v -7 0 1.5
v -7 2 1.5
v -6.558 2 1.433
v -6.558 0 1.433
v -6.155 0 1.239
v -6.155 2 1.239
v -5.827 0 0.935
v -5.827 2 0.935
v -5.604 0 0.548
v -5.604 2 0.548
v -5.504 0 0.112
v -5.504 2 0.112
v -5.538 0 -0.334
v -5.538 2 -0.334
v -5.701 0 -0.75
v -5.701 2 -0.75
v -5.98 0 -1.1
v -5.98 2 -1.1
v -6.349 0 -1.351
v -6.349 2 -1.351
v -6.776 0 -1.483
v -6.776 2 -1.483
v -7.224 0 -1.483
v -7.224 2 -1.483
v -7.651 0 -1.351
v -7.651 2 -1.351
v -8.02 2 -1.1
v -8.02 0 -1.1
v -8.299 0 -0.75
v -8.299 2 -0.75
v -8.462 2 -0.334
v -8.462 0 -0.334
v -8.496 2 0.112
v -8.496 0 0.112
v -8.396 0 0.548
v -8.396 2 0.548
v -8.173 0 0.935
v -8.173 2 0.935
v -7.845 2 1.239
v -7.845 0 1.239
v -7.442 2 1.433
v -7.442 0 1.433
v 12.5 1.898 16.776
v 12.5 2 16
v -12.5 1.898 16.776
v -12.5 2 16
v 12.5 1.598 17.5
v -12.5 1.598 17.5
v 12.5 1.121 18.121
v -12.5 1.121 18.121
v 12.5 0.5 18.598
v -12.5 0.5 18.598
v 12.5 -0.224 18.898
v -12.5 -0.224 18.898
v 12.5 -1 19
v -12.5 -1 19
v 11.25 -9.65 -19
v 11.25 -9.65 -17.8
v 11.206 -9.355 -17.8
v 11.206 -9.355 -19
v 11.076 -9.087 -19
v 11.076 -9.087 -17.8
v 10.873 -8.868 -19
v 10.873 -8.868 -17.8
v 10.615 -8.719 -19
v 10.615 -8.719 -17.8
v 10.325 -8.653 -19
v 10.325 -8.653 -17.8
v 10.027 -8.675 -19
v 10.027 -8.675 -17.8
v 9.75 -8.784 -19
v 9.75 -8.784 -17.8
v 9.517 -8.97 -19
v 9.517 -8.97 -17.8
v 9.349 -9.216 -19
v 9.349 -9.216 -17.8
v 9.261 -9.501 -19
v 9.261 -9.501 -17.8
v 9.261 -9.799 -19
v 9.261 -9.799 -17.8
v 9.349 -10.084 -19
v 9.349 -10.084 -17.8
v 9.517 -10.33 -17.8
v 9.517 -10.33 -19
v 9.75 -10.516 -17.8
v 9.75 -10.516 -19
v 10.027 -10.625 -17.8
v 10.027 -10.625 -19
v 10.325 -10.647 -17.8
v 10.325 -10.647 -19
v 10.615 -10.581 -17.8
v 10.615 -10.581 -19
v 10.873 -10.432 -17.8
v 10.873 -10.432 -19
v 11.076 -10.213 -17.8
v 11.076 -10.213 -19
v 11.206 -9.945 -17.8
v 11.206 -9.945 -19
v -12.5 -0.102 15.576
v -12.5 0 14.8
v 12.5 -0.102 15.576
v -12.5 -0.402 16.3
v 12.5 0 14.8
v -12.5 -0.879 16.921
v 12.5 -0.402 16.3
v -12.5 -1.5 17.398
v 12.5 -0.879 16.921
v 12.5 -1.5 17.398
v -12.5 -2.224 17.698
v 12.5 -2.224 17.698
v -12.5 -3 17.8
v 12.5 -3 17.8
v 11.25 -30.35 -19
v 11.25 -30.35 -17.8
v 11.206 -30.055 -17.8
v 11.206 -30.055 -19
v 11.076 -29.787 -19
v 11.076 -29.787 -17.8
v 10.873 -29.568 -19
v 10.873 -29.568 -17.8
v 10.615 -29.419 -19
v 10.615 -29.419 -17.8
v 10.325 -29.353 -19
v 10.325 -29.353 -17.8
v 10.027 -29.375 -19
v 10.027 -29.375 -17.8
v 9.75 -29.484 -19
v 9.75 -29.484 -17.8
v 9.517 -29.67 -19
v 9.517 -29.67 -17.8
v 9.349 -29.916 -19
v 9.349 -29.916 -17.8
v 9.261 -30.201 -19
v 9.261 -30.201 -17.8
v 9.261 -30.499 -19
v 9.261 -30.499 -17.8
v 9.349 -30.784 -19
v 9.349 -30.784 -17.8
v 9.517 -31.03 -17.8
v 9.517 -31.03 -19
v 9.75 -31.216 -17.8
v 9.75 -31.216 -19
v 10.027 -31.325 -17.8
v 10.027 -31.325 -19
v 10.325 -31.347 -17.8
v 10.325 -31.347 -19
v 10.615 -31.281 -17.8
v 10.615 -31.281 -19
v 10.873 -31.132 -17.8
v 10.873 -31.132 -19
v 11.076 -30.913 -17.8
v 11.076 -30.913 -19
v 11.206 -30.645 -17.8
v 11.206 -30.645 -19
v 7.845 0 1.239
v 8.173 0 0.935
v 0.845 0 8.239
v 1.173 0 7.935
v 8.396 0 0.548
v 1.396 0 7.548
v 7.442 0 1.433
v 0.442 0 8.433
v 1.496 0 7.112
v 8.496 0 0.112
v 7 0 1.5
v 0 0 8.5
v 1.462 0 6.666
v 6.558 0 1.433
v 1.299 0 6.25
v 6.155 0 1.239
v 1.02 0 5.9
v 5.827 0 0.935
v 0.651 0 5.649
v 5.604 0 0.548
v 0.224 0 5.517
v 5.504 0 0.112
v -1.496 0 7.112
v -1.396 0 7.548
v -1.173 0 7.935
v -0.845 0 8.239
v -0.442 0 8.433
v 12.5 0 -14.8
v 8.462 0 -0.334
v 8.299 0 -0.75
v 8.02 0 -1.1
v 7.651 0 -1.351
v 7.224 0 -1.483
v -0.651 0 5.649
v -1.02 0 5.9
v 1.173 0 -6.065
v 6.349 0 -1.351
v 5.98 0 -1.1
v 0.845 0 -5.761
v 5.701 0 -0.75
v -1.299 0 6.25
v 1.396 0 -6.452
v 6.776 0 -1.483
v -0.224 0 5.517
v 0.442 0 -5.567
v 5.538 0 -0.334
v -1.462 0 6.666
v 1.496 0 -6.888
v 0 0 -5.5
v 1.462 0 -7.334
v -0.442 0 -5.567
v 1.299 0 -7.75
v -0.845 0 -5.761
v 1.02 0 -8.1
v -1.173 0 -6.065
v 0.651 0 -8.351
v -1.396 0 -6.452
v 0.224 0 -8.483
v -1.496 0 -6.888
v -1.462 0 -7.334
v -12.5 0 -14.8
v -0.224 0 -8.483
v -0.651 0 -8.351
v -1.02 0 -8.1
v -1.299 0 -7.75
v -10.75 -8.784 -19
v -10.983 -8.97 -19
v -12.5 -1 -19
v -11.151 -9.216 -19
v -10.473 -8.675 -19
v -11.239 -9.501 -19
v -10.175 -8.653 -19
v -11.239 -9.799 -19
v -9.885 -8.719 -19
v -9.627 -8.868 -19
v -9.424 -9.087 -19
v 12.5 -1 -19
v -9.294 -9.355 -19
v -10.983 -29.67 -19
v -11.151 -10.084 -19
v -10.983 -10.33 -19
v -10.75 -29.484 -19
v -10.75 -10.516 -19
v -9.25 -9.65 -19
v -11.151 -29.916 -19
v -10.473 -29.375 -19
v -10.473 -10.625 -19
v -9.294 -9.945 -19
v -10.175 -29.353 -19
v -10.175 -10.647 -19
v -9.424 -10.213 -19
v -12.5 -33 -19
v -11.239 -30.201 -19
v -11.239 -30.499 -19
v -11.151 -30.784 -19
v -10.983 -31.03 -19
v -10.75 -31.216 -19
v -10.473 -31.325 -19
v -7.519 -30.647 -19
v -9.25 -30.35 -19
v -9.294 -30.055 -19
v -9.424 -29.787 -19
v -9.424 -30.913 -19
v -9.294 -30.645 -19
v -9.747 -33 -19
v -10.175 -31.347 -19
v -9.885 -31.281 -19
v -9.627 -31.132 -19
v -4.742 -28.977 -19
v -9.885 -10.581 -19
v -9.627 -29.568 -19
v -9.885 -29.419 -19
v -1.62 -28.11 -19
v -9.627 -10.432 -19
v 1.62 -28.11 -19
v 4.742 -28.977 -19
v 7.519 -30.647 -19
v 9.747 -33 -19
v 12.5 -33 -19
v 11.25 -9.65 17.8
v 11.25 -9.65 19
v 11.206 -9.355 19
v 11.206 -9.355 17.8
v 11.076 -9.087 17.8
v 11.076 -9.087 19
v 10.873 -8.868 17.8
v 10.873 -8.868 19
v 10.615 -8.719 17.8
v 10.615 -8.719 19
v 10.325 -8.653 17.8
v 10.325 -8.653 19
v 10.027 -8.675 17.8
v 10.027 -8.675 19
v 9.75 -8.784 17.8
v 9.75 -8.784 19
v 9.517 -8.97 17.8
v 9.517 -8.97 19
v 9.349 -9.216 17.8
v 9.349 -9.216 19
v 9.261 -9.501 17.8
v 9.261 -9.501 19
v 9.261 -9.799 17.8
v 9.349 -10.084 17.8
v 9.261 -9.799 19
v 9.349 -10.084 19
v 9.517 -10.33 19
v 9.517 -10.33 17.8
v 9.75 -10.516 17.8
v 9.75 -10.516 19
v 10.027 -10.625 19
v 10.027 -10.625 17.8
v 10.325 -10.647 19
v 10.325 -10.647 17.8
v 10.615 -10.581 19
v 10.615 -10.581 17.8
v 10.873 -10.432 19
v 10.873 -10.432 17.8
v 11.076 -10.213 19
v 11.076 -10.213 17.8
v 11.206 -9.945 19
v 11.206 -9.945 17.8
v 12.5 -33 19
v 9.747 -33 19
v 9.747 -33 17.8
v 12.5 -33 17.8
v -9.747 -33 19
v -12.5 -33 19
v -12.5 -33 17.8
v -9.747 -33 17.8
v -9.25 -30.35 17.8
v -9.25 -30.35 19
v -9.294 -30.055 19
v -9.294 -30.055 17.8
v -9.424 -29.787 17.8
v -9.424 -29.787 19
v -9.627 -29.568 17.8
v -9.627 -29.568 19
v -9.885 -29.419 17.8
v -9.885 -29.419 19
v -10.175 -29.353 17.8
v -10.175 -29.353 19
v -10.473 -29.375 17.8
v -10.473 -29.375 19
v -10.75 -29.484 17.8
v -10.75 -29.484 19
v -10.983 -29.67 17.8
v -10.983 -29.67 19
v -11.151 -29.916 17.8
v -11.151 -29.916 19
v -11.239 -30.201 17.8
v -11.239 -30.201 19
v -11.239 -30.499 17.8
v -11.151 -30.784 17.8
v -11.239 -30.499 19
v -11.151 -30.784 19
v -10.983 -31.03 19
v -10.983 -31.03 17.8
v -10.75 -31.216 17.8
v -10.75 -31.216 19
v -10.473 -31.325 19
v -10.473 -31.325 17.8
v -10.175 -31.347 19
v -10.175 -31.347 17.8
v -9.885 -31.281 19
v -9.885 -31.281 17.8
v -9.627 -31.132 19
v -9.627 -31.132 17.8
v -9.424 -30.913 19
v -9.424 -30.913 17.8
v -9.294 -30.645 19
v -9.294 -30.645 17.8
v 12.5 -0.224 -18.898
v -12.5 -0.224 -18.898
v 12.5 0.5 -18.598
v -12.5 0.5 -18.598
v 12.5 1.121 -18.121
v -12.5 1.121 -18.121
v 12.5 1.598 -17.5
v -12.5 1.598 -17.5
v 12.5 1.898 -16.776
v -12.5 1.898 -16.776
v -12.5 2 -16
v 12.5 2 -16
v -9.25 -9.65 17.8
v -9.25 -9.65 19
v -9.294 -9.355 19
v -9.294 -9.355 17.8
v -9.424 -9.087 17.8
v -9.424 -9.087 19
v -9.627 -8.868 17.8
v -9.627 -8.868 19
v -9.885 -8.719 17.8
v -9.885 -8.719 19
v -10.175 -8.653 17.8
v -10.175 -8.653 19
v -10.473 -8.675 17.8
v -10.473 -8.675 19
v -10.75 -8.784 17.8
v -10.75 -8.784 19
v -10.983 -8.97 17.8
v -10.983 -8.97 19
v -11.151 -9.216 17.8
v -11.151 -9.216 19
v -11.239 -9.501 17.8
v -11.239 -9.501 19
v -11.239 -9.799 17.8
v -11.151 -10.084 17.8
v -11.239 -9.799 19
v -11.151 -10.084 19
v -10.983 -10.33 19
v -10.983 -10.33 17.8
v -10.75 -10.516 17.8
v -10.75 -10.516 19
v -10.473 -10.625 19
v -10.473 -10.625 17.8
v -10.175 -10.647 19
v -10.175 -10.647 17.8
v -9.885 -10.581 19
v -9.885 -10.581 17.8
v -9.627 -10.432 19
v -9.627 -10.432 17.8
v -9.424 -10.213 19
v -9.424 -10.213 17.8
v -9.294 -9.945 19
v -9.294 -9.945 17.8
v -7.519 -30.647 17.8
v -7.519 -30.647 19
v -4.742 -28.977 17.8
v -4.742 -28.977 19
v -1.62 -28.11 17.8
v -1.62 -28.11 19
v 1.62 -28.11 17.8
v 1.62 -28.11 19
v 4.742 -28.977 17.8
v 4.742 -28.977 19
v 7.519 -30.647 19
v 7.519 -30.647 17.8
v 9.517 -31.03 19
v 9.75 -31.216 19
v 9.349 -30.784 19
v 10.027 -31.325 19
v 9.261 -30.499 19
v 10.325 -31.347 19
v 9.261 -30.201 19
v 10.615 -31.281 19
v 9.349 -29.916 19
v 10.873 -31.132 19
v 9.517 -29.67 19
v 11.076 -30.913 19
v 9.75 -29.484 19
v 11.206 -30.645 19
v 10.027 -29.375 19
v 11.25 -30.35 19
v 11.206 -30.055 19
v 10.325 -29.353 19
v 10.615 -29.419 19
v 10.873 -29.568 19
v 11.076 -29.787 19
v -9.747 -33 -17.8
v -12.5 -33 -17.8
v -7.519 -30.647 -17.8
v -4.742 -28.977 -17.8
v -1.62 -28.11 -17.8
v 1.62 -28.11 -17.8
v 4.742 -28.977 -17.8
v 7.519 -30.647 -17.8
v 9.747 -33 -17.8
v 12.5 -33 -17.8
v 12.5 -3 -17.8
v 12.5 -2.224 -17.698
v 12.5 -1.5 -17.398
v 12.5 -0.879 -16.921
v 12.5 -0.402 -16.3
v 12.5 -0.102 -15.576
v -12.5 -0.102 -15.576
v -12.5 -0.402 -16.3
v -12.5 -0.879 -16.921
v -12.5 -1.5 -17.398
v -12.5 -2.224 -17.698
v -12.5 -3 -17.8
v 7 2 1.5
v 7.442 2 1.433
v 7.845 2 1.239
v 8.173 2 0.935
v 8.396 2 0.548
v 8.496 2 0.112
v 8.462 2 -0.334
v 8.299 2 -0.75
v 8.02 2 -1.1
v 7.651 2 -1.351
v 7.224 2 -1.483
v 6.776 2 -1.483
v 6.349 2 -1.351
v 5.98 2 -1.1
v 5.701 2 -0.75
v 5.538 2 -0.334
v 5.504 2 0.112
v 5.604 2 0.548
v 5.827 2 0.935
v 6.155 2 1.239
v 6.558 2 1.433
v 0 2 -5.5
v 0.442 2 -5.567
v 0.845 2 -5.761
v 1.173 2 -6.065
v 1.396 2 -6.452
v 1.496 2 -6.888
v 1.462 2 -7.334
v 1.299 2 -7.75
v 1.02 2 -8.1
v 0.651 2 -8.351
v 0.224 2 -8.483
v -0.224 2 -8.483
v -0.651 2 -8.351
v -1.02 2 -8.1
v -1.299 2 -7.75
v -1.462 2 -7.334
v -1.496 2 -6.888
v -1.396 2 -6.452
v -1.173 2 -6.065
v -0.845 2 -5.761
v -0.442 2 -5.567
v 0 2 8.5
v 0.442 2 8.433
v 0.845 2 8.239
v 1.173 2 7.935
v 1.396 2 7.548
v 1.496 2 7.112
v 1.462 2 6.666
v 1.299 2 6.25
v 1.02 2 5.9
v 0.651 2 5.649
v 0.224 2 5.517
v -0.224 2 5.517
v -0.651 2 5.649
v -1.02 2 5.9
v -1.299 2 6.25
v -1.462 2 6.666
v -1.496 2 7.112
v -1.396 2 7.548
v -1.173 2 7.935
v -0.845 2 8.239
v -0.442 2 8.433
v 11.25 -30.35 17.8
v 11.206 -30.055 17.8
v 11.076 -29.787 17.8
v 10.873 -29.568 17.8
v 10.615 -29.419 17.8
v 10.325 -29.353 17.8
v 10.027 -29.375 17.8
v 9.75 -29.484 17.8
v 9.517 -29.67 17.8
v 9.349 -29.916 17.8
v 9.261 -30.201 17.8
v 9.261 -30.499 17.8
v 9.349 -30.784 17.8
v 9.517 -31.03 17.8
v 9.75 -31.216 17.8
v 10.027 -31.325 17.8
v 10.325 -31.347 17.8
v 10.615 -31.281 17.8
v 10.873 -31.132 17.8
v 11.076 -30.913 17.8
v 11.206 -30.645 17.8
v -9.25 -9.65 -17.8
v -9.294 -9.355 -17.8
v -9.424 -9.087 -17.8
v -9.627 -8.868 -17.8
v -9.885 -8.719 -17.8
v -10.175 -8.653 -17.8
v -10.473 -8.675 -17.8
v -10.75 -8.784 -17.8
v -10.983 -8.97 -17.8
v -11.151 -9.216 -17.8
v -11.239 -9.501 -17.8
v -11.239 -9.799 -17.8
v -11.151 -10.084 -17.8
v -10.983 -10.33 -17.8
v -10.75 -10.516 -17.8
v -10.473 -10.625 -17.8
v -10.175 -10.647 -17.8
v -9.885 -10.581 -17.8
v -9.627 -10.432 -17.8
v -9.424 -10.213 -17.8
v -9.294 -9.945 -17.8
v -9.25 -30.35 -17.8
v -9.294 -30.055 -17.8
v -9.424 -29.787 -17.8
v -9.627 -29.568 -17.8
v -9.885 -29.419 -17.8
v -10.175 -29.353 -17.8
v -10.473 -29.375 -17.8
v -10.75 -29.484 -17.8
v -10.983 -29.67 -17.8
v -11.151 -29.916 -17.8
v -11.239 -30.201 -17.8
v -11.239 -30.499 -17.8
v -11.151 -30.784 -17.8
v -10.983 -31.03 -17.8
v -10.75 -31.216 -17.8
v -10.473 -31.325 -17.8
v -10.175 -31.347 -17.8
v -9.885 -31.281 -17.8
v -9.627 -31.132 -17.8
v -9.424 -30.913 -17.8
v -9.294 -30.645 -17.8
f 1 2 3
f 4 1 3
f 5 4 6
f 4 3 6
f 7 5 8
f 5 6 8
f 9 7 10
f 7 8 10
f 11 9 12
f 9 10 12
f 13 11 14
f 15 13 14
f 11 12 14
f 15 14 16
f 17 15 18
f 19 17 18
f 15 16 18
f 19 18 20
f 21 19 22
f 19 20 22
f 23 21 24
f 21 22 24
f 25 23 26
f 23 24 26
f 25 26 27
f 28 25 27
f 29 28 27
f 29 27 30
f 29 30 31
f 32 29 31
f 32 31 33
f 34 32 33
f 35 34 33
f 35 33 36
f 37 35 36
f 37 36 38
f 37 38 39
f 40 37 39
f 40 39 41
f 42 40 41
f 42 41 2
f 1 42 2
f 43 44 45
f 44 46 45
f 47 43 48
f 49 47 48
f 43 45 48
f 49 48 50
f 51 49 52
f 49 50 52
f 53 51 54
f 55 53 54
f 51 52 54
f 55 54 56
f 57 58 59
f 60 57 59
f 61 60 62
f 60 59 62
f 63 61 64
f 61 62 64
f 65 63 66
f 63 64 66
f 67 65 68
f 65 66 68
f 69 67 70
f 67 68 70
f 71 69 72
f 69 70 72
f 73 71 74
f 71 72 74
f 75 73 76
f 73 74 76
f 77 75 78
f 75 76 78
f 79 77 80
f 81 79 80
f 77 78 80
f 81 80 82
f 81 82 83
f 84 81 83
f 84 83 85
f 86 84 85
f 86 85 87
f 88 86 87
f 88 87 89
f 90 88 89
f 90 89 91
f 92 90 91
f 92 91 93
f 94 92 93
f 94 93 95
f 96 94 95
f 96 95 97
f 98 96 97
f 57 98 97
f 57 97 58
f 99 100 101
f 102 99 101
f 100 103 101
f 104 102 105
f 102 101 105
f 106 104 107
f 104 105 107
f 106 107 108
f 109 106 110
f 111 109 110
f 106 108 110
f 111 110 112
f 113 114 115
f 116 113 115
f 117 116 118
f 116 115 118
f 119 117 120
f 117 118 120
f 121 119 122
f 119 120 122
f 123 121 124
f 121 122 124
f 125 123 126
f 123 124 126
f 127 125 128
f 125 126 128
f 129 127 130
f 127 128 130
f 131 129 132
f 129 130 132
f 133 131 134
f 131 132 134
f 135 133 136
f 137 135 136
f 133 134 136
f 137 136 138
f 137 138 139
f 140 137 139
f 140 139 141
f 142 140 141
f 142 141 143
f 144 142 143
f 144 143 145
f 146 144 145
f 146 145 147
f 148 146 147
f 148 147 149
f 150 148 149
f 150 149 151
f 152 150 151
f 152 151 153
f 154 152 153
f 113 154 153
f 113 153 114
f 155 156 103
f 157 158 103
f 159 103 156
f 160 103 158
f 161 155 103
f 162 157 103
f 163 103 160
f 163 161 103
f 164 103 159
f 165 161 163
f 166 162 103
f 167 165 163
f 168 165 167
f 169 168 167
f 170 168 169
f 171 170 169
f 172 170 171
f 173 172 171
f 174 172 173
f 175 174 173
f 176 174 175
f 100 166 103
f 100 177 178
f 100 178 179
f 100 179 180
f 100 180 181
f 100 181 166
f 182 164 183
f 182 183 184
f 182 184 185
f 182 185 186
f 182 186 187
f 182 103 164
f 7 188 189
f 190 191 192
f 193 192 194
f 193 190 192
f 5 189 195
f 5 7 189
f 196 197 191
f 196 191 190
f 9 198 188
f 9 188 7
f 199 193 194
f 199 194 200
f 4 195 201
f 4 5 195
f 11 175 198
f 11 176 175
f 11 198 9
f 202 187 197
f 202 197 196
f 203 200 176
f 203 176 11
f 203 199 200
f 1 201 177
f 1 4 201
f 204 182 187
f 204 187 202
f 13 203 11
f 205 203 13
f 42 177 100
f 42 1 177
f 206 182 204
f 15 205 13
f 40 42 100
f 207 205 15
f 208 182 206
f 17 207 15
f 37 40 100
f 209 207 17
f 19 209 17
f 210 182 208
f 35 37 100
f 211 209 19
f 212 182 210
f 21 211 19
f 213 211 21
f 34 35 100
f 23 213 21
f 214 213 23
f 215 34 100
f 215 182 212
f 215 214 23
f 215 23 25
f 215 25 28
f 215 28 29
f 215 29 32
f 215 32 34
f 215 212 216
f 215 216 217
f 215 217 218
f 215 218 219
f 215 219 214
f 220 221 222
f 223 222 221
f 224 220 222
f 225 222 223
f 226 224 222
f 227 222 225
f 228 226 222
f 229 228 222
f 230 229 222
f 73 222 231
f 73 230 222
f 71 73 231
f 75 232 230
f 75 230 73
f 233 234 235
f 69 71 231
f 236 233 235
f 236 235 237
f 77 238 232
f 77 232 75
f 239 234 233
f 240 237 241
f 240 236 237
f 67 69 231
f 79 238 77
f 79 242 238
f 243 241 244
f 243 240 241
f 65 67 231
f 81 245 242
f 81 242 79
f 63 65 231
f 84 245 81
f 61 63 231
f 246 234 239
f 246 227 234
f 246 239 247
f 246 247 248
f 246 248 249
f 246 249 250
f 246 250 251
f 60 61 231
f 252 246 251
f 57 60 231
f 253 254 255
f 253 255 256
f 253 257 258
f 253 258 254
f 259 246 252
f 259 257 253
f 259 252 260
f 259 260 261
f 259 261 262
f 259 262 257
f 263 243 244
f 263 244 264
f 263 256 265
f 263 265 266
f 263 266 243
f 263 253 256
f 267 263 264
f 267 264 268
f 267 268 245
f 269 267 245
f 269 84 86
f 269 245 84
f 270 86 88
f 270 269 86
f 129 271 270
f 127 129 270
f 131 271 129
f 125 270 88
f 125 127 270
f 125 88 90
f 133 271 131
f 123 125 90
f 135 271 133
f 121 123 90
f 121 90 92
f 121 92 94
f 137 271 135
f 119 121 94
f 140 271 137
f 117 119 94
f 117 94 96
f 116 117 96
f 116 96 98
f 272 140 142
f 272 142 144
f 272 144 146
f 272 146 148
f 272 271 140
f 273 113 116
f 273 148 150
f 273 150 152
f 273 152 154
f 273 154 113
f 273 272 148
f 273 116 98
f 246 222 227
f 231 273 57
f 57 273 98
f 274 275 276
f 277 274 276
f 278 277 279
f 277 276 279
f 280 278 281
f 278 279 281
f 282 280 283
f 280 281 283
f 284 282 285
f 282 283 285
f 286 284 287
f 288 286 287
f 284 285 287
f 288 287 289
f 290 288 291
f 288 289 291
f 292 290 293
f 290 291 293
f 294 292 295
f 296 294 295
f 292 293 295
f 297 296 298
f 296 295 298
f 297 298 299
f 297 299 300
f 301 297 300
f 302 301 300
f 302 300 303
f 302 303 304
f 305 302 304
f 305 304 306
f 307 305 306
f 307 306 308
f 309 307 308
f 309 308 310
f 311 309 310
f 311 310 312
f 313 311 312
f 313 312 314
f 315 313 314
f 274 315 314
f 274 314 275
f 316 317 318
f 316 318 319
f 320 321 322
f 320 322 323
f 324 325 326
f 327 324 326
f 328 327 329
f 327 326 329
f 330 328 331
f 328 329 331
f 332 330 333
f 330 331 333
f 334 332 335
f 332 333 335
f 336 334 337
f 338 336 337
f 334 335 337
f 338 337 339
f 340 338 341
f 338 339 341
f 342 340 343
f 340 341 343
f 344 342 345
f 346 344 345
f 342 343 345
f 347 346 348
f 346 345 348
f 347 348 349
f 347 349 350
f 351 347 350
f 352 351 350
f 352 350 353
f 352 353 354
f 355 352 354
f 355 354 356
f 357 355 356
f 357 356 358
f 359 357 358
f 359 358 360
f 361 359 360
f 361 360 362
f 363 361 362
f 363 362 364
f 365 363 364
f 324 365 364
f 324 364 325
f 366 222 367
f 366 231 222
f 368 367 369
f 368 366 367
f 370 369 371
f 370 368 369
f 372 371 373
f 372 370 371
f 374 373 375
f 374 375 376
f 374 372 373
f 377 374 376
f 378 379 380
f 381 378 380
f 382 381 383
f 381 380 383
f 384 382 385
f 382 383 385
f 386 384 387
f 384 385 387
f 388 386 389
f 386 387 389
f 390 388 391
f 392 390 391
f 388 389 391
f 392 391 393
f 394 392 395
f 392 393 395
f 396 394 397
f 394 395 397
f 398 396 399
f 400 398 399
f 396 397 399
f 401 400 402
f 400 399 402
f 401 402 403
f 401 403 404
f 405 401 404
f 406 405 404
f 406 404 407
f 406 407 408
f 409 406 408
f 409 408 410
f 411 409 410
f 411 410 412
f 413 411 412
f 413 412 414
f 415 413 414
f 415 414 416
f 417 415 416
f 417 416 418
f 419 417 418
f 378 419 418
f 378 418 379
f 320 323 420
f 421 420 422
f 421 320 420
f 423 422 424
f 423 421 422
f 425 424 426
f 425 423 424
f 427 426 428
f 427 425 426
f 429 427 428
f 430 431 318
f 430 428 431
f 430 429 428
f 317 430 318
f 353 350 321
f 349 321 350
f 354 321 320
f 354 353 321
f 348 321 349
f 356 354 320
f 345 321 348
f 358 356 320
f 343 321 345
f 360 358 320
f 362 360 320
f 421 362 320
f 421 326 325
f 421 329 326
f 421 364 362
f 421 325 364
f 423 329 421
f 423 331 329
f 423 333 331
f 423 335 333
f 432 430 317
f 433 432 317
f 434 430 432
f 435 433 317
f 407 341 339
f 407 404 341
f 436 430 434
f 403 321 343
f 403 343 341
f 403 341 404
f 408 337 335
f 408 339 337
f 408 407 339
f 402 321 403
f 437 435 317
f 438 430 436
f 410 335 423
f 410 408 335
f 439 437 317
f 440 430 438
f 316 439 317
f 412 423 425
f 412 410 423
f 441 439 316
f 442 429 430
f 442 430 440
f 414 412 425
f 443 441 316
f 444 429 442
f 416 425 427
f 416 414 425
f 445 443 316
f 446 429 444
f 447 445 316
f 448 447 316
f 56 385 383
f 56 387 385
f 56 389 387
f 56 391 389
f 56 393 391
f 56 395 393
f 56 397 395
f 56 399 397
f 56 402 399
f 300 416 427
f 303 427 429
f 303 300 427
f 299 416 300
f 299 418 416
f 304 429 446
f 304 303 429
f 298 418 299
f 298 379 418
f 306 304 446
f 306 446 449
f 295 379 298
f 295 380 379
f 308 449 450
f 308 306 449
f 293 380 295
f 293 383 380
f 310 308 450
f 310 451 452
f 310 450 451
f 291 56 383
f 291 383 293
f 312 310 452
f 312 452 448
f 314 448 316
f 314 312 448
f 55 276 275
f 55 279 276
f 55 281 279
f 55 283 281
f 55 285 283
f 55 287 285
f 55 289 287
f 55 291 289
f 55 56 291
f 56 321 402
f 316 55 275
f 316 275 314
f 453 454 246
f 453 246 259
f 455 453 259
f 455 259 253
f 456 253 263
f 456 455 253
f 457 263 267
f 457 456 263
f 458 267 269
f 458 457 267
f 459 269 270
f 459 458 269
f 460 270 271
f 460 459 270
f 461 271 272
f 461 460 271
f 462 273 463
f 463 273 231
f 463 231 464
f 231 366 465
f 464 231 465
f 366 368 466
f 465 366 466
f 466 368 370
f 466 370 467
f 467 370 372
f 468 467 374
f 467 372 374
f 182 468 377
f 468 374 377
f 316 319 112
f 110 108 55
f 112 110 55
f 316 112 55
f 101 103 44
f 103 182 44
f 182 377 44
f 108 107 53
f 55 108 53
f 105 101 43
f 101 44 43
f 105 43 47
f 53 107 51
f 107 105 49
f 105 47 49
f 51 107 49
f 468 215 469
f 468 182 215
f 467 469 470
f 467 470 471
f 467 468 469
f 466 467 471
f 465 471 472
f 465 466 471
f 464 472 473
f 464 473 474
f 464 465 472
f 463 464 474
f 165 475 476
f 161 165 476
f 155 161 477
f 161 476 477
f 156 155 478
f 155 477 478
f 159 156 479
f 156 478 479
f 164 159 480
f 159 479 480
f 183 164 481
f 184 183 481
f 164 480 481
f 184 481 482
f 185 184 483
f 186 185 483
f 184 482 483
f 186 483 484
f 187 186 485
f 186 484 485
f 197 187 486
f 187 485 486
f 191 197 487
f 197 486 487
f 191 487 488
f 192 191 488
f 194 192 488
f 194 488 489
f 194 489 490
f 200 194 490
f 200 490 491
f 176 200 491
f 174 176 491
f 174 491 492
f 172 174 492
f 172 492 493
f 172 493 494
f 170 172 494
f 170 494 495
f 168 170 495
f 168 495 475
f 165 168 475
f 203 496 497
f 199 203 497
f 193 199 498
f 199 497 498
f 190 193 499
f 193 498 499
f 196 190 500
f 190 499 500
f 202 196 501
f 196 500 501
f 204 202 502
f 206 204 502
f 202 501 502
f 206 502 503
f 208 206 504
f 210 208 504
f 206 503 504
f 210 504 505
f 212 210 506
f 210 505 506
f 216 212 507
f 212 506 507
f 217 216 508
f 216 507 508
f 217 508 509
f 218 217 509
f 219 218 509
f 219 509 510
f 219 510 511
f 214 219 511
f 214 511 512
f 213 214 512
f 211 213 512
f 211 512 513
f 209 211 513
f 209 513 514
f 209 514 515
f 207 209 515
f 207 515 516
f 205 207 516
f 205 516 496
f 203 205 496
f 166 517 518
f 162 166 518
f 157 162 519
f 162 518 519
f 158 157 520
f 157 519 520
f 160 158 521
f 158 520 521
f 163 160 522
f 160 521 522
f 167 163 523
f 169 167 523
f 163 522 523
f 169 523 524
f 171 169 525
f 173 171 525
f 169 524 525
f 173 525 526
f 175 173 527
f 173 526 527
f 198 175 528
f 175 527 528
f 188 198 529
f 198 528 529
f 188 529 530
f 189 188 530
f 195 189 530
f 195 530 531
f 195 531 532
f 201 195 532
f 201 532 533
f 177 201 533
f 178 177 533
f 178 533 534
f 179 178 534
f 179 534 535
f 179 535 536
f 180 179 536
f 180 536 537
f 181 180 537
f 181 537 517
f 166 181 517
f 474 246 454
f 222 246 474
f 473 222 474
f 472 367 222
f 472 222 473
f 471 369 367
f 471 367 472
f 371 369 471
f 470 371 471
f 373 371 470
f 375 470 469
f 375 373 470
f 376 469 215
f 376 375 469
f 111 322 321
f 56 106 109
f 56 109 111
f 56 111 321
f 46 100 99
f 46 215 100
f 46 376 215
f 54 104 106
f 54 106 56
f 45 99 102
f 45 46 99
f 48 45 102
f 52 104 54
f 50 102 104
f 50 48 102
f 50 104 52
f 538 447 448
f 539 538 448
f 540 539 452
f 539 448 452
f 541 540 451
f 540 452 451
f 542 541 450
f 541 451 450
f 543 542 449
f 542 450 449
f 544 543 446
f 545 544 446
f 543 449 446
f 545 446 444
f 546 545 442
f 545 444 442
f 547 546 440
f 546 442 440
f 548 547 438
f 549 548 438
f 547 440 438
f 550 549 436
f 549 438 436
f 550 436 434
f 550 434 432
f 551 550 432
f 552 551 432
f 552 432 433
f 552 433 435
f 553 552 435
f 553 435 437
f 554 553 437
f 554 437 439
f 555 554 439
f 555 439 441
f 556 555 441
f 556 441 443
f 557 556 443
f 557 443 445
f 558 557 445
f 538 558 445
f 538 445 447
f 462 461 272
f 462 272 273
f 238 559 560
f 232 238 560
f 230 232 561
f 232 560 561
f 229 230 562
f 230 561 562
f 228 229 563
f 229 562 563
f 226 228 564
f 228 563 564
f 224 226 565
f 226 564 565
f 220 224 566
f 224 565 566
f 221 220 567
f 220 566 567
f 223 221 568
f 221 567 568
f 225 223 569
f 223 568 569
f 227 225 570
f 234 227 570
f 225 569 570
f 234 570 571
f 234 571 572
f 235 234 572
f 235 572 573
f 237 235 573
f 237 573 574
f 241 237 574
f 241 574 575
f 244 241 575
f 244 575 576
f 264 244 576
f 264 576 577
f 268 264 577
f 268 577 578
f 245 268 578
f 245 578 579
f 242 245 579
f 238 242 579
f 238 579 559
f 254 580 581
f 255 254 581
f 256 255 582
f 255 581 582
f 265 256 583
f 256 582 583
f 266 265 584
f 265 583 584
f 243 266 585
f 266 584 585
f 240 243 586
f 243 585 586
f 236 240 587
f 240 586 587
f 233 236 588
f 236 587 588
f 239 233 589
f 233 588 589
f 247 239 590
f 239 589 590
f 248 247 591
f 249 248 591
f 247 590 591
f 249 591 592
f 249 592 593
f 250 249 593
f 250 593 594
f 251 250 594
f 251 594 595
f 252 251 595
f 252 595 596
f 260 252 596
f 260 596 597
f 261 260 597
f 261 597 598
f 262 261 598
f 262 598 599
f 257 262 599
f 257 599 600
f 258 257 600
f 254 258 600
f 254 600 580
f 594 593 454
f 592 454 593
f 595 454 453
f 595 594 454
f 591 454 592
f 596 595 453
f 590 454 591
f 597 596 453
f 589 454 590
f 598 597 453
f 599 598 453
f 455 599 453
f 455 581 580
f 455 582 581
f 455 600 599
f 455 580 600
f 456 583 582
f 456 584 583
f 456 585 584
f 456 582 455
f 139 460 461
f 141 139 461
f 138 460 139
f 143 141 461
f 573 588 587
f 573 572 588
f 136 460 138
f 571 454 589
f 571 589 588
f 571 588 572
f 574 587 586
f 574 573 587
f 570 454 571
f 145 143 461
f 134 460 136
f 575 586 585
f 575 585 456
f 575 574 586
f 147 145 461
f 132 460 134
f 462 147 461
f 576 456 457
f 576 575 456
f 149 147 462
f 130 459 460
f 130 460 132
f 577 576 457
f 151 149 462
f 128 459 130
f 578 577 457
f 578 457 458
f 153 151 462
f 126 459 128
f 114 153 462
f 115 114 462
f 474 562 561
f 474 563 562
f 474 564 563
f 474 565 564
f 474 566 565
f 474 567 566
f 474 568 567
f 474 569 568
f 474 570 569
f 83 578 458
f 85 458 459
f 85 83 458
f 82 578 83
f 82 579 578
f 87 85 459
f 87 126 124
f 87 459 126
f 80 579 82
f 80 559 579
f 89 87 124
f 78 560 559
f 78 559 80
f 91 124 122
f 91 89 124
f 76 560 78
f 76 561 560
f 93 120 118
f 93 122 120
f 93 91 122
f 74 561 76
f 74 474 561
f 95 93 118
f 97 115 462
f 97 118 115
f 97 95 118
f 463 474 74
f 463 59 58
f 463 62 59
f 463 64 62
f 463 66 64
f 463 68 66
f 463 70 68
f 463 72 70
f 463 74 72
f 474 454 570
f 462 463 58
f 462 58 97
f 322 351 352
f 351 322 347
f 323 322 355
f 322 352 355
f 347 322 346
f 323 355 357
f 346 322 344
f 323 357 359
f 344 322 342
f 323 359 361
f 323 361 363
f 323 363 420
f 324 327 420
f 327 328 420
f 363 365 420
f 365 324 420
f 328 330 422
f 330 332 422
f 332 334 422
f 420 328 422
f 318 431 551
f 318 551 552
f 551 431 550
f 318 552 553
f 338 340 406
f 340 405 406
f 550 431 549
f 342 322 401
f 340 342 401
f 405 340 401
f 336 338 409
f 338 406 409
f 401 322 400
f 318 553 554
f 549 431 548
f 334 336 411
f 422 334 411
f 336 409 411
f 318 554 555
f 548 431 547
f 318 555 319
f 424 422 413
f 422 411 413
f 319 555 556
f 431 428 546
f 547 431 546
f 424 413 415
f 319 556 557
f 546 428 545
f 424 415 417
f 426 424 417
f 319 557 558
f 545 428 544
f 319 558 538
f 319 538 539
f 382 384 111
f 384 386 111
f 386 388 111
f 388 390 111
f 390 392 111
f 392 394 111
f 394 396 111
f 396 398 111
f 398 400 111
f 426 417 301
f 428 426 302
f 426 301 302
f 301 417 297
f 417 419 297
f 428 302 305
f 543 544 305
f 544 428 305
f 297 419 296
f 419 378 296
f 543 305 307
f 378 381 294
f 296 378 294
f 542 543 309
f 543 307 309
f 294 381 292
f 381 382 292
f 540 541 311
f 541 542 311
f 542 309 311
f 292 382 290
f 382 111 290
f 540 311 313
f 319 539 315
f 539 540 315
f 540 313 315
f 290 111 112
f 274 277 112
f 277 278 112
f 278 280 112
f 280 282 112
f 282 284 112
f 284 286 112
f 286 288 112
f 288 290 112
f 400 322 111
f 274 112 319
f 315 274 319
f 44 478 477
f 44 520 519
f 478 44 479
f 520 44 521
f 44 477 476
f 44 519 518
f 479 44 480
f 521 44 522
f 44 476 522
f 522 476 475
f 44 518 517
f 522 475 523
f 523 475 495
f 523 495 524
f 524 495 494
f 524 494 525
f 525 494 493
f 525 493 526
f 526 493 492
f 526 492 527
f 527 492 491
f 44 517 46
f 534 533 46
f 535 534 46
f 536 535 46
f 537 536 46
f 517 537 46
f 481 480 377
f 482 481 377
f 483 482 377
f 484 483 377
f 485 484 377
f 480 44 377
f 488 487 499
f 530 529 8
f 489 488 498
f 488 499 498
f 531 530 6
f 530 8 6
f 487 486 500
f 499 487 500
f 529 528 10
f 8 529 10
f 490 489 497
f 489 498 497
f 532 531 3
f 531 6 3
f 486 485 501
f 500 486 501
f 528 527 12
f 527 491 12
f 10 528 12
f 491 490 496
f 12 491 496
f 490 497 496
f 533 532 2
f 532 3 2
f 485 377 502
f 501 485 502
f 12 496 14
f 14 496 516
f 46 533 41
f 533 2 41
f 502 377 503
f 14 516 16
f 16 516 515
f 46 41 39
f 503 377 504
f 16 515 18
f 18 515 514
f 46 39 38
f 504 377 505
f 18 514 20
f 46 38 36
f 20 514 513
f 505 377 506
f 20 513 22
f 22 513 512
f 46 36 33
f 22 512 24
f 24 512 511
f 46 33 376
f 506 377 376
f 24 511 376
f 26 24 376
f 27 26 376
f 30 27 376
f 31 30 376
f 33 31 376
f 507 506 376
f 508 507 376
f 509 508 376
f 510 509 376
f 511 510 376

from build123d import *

# Parameters (mm, degrees)
EXTRUDE_1_DEPTH      = 2
SKETCH_4_W           = 25
SKETCH_4_H           = 1.2
EXTRUDE_3_DEPTH      = 40
FILLET_2_R           = 3
SKETCH_7_R           = 1
CUT_EXTRUDE_3_DEPTH  = 59.857879676
SKETCH_8_OUTSIDE_W   = 56.19
SKETCH_8_OUTSIDE_H   = 53.19
SKETCH_8_OUTSIDE_W_2 = 25
SKETCH_8_OUTSIDE_H_2 = 38
CUT_EXTRUDE_4_DEPTH  = 10
SKETCH_9_R           = 1.5
CUT_EXTRUDE_5_DEPTH  = 10


with BuildPart() as part:
    # 草图1 → 凸台-拉伸1 (new body)
    with BuildSketch(Plane(origin=(0, 0, 0), x_dir=(1, 0, 0), z_dir=(0, 1, 0))):
        Polygon((12.5, -10), (12.5, -19), (-12.5, -19), (-12.5, -10), (-20.5, -10), (-20.5, 10), (-12.5, 10), (-12.5, 19), (12.5, 19), (12.5, 10), (20.5, 10), (20.5, -10), align=None)
    extrude(amount=EXTRUDE_1_DEPTH)

    # 草图4 → 凸台-拉伸3 (add)
    with BuildSketch(Plane.XZ):
        with Locations((0, 18.4)):
            Rectangle(SKETCH_4_W, SKETCH_4_H)
        with Locations((0, -18.4)):
            Rectangle(SKETCH_4_W, SKETCH_4_H)
    extrude(amount=EXTRUDE_3_DEPTH)

    # 圆角2
    fillet_2_edges = [part.edges().sort_by_distance(p)[0] for p in [
        (0, 2, -19),
        (0, 2, 19),
        (0, 0, 17.8),
        (0, 0, -17.8),
    ]]
    fillet(fillet_2_edges, radius=FILLET_2_R)

    # 草图7 → 切除-拉伸3 (cut, through all)
    with BuildSketch(Plane.XY.offset(19)):
        with Locations((-10.25, -30.35)):
            Circle(SKETCH_7_R)
        with Locations((-10.25, -9.65)):
            Circle(SKETCH_7_R)
        with Locations((10.25, -9.65)):
            Circle(SKETCH_7_R)
        with Locations((10.25, -30.35)):
            Circle(SKETCH_7_R)
        with BuildLine():
            Line((-12.5, -33), (-9.746794345, -33))
            ThreePointArc((-9.746794345, -33), (0, -28), (9.746794345, -33))
            Line((9.746794345, -33), (12.5, -33))
            Line((12.5, -33), (12.5, -40))
            Line((12.5, -40), (-12.5, -40))
            Line((-12.5, -40), (-12.5, -33))
        make_face()
    extrude(amount=-CUT_EXTRUDE_3_DEPTH, mode=Mode.SUBTRACT)

    # 草图8 outside → 切除-拉伸4 (cut)
    with BuildSketch(Plane(origin=(0, 2, 0), x_dir=(1, 0, 0), z_dir=(0, 1, 0))):
        Rectangle(SKETCH_8_OUTSIDE_W, SKETCH_8_OUTSIDE_H)
        Rectangle(SKETCH_8_OUTSIDE_W_2, SKETCH_8_OUTSIDE_H_2, mode=Mode.SUBTRACT)
    extrude(amount=-CUT_EXTRUDE_4_DEPTH, mode=Mode.SUBTRACT)

    # 草图9 → 切除-拉伸5 (cut)
    with BuildSketch(Plane(origin=(0, 2, 0), x_dir=(1, 0, 0), z_dir=(0, 1, 0))):
        with Locations(Location((0, -7, 0), (0, 0, 270))):
            Circle(SKETCH_9_R)
        with Locations(Location((-7, 0, 0), (0, 0, 270))):
            Circle(SKETCH_9_R)
        with Locations(Location((0, 7, 0), (0, 0, 270))):
            Circle(SKETCH_9_R)
        with Locations(Location((7, 0, 0), (0, 0, 270))):
            Circle(SKETCH_9_R)
    extrude(amount=-CUT_EXTRUDE_5_DEPTH, mode=Mode.SUBTRACT)


solid = part.part
